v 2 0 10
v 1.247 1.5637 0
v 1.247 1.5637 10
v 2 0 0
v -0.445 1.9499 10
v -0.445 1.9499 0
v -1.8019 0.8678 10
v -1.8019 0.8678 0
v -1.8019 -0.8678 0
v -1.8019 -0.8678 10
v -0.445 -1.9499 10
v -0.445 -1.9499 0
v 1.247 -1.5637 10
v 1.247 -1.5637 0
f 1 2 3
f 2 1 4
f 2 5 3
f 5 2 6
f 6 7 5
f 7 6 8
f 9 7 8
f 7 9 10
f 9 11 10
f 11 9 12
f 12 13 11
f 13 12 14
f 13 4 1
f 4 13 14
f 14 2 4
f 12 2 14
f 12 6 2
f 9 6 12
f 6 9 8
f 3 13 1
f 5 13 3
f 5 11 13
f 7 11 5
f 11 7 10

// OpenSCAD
// Unit of length: Unit.MM
cylinder(h = 10.0, r = 2.0, center = false);
